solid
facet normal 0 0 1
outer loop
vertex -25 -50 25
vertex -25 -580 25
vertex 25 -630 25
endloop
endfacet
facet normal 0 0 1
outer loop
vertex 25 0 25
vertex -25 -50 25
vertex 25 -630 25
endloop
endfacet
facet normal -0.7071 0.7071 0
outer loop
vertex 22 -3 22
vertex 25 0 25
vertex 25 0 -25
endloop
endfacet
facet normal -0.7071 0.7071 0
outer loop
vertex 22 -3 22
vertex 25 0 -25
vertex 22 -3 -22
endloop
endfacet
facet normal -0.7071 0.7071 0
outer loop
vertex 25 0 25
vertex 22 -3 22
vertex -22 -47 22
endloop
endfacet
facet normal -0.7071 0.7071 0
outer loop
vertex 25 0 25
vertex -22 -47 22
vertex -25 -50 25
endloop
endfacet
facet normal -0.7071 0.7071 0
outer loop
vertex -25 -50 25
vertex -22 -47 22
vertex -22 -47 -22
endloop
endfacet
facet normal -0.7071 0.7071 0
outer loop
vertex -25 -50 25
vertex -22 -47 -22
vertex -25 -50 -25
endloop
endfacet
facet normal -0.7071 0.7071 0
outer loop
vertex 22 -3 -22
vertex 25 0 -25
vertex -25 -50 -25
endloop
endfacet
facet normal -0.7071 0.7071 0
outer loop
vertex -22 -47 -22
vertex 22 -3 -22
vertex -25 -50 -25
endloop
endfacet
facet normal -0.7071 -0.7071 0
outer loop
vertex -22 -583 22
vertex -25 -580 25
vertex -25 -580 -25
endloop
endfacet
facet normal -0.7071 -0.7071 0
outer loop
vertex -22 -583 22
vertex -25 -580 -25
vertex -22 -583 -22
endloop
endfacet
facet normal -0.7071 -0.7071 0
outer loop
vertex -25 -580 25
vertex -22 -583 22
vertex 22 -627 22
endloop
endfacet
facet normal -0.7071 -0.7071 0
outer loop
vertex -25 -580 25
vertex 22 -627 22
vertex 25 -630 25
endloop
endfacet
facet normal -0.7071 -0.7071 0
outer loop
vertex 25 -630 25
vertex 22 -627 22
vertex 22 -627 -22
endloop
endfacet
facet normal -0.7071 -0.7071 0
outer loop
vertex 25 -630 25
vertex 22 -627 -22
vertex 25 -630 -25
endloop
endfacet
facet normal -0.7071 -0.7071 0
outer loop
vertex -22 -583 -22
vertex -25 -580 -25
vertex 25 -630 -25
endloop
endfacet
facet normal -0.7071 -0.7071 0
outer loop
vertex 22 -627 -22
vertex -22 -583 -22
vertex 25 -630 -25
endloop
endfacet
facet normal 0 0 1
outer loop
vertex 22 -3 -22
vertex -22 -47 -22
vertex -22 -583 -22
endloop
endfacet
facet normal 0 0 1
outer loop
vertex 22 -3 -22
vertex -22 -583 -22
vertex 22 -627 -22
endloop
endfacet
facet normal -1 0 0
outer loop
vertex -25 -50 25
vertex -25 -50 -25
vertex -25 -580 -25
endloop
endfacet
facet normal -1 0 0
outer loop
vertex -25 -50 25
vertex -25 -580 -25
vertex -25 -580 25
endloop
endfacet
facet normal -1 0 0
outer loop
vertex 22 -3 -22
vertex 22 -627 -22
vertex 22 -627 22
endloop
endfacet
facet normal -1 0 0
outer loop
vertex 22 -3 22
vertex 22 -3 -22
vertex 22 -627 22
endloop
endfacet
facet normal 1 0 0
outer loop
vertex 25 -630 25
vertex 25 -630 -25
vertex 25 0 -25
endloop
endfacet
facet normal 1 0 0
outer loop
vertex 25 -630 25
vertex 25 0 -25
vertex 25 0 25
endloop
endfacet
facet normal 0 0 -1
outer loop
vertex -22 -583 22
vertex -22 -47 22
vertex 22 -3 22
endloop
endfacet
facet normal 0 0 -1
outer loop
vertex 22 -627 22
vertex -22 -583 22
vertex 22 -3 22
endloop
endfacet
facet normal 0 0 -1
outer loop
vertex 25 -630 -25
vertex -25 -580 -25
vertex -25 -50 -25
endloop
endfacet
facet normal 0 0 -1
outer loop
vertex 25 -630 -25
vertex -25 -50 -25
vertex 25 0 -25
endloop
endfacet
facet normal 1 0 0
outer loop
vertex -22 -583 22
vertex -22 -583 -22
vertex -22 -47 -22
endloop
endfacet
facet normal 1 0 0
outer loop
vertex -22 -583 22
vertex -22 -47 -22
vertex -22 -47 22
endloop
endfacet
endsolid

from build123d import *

# Parameters (mm, degrees)
F0_W        = 50
F0_H        = 50
F0_W_2      = 44
F0_H_2      = 44
F1_DEPTH    = 630
F2_T1_DEPTH = 307.1682987966
F3_T1_DEPTH = 307.1682987966


# Not quite as in the source:
# - a fillet or chamfer that OpenCascade refuses, or shapes differently, is made with other operations: its cross-section is extruded or revolved along the edge and cut away or added


with BuildPart() as f1:
    # F0 (on Front) → F1 (new body)
    with BuildSketch(Plane.XZ):
        Rectangle(F0_W, F0_H)
        Rectangle(F0_W_2, F0_H_2, mode=Mode.SUBTRACT)
    extrude(amount=F1_DEPTH)

    # F2: chamfer of 50 on 1 edges, made by hand

    # F2_s2 → F2_t1 (cut)
    with BuildSketch(Plane.XY.offset(-153.5841493983)):
        Polygon((-25, -580), (25, -630), (-25, -630), align=None)
    extrude(amount=F2_T1_DEPTH, mode=Mode.SUBTRACT)

    # F3: chamfer of 50 on 1 edges, made by hand

    # F3_s2 → F3_t1 (cut)
    with BuildSketch(Plane.XY.offset(-153.5841493983)):
        Polygon((25, 0), (-25, -50), (-25, 0), align=None)
    extrude(amount=F3_T1_DEPTH, mode=Mode.SUBTRACT)


solid = f1.part
